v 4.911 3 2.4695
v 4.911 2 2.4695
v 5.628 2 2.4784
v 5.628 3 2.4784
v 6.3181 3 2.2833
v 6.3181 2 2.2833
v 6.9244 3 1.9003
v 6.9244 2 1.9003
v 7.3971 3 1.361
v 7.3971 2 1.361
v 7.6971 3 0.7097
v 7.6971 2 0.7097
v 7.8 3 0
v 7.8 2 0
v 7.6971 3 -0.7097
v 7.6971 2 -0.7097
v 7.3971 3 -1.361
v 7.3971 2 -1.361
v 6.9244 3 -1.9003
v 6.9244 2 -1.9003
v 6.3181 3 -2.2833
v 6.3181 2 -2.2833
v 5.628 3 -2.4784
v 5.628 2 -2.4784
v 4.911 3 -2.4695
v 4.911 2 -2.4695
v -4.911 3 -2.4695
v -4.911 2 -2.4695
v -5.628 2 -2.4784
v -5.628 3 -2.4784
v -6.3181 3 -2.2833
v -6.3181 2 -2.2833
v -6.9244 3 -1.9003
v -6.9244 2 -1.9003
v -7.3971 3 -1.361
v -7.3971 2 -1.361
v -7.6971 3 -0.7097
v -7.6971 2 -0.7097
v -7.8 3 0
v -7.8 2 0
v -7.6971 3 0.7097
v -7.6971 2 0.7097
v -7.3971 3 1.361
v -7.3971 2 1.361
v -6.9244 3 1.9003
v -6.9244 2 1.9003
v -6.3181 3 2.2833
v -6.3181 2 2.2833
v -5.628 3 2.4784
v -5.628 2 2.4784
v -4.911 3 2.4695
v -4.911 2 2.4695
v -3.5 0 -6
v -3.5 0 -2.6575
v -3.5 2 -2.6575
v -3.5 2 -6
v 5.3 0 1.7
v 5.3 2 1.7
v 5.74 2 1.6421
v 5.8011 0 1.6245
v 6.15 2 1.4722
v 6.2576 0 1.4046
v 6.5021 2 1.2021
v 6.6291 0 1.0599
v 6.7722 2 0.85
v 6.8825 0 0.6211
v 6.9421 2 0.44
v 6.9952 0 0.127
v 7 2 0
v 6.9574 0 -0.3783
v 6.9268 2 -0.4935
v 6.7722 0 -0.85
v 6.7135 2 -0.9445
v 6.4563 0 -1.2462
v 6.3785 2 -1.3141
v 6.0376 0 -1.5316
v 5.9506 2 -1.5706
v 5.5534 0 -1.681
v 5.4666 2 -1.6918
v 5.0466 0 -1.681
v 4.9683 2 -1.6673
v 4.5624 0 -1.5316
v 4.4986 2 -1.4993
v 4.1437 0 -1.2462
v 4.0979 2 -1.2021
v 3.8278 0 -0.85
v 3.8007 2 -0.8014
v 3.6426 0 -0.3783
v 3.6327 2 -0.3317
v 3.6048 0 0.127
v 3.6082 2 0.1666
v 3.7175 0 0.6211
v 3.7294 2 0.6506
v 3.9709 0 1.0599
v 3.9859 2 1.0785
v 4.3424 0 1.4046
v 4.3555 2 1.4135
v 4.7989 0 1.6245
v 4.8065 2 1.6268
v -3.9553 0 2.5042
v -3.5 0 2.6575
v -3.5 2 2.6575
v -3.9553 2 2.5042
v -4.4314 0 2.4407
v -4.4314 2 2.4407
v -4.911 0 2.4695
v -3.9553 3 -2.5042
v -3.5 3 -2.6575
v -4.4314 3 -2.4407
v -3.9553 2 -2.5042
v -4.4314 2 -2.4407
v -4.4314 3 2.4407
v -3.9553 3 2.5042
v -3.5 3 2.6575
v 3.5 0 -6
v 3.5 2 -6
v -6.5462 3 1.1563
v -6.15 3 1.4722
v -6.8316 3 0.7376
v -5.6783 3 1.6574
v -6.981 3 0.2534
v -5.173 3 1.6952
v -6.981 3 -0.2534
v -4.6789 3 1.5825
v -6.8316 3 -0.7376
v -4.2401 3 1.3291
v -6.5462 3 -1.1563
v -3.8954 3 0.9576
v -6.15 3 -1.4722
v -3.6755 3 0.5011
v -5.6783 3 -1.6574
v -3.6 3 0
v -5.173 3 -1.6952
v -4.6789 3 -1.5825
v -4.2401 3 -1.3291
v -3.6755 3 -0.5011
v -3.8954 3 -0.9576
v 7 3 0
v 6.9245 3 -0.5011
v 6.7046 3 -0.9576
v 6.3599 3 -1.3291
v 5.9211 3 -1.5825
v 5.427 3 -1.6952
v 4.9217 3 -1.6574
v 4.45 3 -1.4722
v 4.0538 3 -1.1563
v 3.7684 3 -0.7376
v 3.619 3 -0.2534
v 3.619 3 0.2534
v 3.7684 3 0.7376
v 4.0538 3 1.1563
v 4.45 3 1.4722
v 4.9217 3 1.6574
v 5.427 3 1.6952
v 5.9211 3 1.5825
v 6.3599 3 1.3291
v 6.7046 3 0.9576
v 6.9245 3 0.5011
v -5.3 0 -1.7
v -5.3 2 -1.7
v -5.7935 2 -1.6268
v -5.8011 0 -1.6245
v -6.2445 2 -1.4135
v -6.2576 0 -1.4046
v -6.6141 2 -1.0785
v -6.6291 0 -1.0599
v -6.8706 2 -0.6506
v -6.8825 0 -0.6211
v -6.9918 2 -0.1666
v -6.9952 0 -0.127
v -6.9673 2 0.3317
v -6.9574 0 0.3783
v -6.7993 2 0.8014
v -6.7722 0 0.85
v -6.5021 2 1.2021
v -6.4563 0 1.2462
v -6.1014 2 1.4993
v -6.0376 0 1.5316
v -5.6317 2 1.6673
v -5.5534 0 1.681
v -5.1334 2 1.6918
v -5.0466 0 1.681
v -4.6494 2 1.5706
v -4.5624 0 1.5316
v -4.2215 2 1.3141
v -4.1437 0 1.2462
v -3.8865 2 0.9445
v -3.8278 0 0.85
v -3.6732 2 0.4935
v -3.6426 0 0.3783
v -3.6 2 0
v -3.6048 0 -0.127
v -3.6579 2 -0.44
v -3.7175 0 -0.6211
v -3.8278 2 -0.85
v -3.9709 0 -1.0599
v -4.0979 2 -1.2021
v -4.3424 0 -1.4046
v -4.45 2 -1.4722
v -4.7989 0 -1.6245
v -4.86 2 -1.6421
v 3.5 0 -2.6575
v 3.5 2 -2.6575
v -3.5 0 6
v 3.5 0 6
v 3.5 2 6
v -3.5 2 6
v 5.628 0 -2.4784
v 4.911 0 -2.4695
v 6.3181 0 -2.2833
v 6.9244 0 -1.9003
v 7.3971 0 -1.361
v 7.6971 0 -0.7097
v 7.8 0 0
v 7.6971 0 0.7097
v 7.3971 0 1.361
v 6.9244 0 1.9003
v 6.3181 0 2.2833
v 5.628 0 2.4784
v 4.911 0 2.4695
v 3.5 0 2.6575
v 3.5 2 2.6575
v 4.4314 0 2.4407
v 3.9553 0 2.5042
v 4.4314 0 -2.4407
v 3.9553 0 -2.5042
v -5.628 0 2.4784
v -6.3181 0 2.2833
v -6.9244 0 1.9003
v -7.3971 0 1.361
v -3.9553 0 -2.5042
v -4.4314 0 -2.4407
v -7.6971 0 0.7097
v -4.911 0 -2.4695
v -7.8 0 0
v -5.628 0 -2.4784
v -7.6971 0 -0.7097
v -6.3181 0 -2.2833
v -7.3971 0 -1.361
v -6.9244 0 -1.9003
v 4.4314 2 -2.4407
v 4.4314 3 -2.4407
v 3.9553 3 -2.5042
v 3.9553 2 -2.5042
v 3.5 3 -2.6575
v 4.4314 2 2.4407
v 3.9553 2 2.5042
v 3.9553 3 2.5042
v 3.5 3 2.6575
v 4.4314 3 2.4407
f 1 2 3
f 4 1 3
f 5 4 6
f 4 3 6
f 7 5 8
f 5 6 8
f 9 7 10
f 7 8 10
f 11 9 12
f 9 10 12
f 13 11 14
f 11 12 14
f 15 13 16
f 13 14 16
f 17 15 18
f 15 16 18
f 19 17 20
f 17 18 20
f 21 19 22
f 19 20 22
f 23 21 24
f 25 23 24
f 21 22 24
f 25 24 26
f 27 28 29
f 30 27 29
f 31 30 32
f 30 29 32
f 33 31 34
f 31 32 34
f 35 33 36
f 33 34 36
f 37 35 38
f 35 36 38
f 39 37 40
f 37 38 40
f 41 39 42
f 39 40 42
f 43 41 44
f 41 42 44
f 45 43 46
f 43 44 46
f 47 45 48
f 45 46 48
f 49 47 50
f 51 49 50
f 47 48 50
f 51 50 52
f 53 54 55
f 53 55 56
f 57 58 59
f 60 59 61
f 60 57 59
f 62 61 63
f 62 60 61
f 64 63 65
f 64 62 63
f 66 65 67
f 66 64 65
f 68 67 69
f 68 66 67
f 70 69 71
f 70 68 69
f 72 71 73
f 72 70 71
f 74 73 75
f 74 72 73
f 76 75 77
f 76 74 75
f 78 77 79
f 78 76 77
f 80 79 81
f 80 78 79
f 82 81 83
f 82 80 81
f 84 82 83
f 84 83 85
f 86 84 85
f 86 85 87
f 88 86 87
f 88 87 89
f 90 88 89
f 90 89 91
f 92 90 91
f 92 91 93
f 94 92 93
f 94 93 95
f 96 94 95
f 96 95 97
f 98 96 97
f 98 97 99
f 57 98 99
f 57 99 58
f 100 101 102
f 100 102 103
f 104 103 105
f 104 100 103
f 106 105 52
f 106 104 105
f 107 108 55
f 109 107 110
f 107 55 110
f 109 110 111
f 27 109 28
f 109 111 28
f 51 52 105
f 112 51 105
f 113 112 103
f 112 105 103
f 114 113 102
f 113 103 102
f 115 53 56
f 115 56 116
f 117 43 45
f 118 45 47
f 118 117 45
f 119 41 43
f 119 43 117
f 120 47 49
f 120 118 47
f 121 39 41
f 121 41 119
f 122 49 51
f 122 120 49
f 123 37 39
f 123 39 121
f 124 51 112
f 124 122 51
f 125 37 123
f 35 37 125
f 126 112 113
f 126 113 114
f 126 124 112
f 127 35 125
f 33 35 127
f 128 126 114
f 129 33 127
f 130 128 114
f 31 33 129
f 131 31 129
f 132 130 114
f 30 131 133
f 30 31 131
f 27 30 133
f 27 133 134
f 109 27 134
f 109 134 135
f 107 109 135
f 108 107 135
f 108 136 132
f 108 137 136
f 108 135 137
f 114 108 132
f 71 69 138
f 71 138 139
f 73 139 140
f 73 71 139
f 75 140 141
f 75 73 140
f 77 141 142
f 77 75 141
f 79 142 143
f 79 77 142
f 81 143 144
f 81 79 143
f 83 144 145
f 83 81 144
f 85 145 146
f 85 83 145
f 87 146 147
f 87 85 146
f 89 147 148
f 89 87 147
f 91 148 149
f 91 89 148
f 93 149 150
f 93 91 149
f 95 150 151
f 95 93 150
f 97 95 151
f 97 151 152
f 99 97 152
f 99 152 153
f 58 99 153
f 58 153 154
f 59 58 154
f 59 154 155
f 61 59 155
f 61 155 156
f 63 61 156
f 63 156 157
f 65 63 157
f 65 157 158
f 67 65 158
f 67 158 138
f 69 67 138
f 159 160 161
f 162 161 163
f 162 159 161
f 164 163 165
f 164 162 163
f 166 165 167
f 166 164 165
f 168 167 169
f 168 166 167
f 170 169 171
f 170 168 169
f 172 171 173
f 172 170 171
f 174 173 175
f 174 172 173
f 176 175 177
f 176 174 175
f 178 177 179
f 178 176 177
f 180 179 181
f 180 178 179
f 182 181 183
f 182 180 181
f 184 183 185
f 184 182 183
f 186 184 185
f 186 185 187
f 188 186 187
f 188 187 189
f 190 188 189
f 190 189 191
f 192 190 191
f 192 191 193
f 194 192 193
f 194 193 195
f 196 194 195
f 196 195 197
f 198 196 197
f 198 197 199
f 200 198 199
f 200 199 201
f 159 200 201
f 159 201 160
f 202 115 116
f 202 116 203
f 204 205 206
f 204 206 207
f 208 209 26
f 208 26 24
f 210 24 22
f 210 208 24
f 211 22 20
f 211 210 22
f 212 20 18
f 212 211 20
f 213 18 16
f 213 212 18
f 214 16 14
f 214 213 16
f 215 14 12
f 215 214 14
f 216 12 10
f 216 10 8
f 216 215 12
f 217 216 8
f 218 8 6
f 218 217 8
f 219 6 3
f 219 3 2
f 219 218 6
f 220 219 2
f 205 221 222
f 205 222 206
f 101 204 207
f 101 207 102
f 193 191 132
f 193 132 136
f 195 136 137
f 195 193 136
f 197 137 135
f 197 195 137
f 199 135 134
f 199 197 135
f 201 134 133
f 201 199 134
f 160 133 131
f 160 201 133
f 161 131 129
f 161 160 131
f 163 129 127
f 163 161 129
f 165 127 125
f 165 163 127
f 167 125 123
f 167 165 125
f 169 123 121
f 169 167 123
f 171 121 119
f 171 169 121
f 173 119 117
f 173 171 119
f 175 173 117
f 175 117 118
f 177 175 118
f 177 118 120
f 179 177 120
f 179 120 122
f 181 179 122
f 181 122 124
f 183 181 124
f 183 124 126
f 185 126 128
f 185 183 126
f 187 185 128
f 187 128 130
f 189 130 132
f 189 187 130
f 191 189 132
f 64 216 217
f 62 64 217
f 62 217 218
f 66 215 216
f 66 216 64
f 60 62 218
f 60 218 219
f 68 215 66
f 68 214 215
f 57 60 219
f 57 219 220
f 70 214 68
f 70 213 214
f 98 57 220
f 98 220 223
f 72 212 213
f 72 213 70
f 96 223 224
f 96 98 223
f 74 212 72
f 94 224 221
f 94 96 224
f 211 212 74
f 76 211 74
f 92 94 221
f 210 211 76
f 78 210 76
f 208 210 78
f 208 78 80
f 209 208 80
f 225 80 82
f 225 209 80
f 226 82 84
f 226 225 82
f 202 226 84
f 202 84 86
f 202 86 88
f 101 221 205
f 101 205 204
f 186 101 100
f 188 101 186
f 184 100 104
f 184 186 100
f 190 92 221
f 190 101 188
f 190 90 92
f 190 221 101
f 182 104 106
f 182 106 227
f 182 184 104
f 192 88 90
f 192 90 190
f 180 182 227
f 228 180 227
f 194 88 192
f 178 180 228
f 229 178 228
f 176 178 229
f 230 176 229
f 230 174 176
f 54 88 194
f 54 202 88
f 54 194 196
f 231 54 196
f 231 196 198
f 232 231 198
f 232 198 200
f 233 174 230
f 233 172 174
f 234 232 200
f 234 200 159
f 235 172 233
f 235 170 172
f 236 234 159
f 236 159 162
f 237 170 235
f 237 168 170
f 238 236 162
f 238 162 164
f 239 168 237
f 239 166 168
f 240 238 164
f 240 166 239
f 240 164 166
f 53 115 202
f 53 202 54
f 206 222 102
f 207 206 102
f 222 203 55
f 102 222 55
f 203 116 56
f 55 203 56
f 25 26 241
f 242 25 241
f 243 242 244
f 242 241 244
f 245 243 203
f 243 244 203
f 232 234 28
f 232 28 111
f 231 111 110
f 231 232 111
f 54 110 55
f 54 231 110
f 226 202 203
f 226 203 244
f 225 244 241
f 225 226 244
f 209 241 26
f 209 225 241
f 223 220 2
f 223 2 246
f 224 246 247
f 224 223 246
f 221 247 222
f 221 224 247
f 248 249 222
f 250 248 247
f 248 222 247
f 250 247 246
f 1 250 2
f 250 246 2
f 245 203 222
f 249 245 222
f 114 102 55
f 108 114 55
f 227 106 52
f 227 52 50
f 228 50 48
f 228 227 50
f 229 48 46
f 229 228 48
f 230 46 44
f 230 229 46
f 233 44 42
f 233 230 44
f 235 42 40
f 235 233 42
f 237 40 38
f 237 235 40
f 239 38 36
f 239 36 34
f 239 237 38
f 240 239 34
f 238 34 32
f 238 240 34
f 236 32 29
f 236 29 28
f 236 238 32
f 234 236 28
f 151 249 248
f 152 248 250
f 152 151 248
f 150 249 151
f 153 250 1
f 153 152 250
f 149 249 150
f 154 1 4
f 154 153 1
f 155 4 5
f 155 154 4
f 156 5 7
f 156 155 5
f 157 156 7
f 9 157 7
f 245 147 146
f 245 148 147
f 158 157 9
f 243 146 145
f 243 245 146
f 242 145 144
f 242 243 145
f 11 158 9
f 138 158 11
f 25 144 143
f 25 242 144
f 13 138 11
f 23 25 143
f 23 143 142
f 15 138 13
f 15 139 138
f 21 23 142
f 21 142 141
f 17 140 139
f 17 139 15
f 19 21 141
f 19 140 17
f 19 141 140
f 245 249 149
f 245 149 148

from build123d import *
from build123d.topology import SkipClean

# Parameters (mm, degrees)
CROQUIS1_R              = 1.7
SALIENTE_EXTRUIR1_DEPTH = 2
CROQUIS5_R              = 1.7
BOSS_EXTRUDE1_DEPTH     = 1


with BuildPart() as part:
    # Croquis1 → Saliente-Extruir1 (new body)
    with BuildSketch(Plane(origin=(0, 0, 0), x_dir=(1, 0, 0), z_dir=(0, 1, 0))):
        with BuildLine():
            Line((-3.5, 6), (3.5, 6))
            Line((3.5, 6), (3.5, 2.657498126))
            ThreePointArc((3.5, 2.657498126), (4.191822894, 2.460979566), (4.910964812, 2.469544821))
            ThreePointArc((4.910964812, 2.469544821), (7.8, 0), (4.910964812, -2.469544821))
            ThreePointArc((4.910964812, -2.469544821), (4.191822894, -2.460979566), (3.5, -2.657498126))
            Line((3.5, -2.657498126), (3.5, -6))
            Line((3.5, -6), (-3.5, -6))
            Line((-3.5, -6), (-3.5, -2.657498126))
            ThreePointArc((-3.5, -2.657498126), (-4.191822894, -2.460979566), (-4.910964812, -2.469544821))
            ThreePointArc((-4.910964812, -2.469544821), (-7.8, 0), (-4.910964812, 2.469544821))
            ThreePointArc((-4.910964812, 2.469544821), (-4.191822894, 2.460979566), (-3.5, 2.657498126))
            Line((-3.5, 2.657498126), (-3.5, 6))
        make_face()
        with Locations(Location((5.3, 0, 0), (0, 0, 270))):
            Circle(CROQUIS1_R, mode=Mode.SUBTRACT)
        with Locations(Location((-5.3, 0, 0), (0, 0, 90))):
            Circle(CROQUIS1_R, mode=Mode.SUBTRACT)
    extrude(amount=SALIENTE_EXTRUIR1_DEPTH)

    # Croquis5 → Boss-Extrude1 (add)
    with SkipClean():  # the faces are left unmerged after this step: merging them gives an invalid solid
        with BuildSketch(Plane(origin=(0, 2, 0), x_dir=(1, 0, 0), z_dir=(0, 1, 0))):
            with BuildLine():
                ThreePointArc((4.910964812, 2.469544821), (4.191822894, 2.460979566), (3.5, 2.657498126))
                Line((3.5, 2.657498126), (3.5, -2.657498126))
                ThreePointArc((3.5, -2.657498126), (4.191822894, -2.460979566), (4.910964812, -2.469544821))
                ThreePointArc((4.910964812, -2.469544821), (7.8, 0), (4.910964812, 2.469544821))
            make_face()
            with Locations((5.3, 0)):
                Circle(CROQUIS5_R, mode=Mode.SUBTRACT)
            with BuildLine():
                ThreePointArc((-4.910964812, -2.469544821), (-4.191822894, -2.460979566), (-3.5, -2.657498126))
                Line((-3.5, -2.657498126), (-3.5, 2.657498126))
                ThreePointArc((-3.5, 2.657498126), (-4.191822894, 2.460979566), (-4.910964812, 2.469544821))
                ThreePointArc((-4.910964812, 2.469544821), (-7.8, 0), (-4.910964812, -2.469544821))
            make_face()
            with Locations((-5.3, 0)):
                Circle(CROQUIS5_R, mode=Mode.SUBTRACT)
        extrude(amount=BOSS_EXTRUDE1_DEPTH)


solid = part.part
